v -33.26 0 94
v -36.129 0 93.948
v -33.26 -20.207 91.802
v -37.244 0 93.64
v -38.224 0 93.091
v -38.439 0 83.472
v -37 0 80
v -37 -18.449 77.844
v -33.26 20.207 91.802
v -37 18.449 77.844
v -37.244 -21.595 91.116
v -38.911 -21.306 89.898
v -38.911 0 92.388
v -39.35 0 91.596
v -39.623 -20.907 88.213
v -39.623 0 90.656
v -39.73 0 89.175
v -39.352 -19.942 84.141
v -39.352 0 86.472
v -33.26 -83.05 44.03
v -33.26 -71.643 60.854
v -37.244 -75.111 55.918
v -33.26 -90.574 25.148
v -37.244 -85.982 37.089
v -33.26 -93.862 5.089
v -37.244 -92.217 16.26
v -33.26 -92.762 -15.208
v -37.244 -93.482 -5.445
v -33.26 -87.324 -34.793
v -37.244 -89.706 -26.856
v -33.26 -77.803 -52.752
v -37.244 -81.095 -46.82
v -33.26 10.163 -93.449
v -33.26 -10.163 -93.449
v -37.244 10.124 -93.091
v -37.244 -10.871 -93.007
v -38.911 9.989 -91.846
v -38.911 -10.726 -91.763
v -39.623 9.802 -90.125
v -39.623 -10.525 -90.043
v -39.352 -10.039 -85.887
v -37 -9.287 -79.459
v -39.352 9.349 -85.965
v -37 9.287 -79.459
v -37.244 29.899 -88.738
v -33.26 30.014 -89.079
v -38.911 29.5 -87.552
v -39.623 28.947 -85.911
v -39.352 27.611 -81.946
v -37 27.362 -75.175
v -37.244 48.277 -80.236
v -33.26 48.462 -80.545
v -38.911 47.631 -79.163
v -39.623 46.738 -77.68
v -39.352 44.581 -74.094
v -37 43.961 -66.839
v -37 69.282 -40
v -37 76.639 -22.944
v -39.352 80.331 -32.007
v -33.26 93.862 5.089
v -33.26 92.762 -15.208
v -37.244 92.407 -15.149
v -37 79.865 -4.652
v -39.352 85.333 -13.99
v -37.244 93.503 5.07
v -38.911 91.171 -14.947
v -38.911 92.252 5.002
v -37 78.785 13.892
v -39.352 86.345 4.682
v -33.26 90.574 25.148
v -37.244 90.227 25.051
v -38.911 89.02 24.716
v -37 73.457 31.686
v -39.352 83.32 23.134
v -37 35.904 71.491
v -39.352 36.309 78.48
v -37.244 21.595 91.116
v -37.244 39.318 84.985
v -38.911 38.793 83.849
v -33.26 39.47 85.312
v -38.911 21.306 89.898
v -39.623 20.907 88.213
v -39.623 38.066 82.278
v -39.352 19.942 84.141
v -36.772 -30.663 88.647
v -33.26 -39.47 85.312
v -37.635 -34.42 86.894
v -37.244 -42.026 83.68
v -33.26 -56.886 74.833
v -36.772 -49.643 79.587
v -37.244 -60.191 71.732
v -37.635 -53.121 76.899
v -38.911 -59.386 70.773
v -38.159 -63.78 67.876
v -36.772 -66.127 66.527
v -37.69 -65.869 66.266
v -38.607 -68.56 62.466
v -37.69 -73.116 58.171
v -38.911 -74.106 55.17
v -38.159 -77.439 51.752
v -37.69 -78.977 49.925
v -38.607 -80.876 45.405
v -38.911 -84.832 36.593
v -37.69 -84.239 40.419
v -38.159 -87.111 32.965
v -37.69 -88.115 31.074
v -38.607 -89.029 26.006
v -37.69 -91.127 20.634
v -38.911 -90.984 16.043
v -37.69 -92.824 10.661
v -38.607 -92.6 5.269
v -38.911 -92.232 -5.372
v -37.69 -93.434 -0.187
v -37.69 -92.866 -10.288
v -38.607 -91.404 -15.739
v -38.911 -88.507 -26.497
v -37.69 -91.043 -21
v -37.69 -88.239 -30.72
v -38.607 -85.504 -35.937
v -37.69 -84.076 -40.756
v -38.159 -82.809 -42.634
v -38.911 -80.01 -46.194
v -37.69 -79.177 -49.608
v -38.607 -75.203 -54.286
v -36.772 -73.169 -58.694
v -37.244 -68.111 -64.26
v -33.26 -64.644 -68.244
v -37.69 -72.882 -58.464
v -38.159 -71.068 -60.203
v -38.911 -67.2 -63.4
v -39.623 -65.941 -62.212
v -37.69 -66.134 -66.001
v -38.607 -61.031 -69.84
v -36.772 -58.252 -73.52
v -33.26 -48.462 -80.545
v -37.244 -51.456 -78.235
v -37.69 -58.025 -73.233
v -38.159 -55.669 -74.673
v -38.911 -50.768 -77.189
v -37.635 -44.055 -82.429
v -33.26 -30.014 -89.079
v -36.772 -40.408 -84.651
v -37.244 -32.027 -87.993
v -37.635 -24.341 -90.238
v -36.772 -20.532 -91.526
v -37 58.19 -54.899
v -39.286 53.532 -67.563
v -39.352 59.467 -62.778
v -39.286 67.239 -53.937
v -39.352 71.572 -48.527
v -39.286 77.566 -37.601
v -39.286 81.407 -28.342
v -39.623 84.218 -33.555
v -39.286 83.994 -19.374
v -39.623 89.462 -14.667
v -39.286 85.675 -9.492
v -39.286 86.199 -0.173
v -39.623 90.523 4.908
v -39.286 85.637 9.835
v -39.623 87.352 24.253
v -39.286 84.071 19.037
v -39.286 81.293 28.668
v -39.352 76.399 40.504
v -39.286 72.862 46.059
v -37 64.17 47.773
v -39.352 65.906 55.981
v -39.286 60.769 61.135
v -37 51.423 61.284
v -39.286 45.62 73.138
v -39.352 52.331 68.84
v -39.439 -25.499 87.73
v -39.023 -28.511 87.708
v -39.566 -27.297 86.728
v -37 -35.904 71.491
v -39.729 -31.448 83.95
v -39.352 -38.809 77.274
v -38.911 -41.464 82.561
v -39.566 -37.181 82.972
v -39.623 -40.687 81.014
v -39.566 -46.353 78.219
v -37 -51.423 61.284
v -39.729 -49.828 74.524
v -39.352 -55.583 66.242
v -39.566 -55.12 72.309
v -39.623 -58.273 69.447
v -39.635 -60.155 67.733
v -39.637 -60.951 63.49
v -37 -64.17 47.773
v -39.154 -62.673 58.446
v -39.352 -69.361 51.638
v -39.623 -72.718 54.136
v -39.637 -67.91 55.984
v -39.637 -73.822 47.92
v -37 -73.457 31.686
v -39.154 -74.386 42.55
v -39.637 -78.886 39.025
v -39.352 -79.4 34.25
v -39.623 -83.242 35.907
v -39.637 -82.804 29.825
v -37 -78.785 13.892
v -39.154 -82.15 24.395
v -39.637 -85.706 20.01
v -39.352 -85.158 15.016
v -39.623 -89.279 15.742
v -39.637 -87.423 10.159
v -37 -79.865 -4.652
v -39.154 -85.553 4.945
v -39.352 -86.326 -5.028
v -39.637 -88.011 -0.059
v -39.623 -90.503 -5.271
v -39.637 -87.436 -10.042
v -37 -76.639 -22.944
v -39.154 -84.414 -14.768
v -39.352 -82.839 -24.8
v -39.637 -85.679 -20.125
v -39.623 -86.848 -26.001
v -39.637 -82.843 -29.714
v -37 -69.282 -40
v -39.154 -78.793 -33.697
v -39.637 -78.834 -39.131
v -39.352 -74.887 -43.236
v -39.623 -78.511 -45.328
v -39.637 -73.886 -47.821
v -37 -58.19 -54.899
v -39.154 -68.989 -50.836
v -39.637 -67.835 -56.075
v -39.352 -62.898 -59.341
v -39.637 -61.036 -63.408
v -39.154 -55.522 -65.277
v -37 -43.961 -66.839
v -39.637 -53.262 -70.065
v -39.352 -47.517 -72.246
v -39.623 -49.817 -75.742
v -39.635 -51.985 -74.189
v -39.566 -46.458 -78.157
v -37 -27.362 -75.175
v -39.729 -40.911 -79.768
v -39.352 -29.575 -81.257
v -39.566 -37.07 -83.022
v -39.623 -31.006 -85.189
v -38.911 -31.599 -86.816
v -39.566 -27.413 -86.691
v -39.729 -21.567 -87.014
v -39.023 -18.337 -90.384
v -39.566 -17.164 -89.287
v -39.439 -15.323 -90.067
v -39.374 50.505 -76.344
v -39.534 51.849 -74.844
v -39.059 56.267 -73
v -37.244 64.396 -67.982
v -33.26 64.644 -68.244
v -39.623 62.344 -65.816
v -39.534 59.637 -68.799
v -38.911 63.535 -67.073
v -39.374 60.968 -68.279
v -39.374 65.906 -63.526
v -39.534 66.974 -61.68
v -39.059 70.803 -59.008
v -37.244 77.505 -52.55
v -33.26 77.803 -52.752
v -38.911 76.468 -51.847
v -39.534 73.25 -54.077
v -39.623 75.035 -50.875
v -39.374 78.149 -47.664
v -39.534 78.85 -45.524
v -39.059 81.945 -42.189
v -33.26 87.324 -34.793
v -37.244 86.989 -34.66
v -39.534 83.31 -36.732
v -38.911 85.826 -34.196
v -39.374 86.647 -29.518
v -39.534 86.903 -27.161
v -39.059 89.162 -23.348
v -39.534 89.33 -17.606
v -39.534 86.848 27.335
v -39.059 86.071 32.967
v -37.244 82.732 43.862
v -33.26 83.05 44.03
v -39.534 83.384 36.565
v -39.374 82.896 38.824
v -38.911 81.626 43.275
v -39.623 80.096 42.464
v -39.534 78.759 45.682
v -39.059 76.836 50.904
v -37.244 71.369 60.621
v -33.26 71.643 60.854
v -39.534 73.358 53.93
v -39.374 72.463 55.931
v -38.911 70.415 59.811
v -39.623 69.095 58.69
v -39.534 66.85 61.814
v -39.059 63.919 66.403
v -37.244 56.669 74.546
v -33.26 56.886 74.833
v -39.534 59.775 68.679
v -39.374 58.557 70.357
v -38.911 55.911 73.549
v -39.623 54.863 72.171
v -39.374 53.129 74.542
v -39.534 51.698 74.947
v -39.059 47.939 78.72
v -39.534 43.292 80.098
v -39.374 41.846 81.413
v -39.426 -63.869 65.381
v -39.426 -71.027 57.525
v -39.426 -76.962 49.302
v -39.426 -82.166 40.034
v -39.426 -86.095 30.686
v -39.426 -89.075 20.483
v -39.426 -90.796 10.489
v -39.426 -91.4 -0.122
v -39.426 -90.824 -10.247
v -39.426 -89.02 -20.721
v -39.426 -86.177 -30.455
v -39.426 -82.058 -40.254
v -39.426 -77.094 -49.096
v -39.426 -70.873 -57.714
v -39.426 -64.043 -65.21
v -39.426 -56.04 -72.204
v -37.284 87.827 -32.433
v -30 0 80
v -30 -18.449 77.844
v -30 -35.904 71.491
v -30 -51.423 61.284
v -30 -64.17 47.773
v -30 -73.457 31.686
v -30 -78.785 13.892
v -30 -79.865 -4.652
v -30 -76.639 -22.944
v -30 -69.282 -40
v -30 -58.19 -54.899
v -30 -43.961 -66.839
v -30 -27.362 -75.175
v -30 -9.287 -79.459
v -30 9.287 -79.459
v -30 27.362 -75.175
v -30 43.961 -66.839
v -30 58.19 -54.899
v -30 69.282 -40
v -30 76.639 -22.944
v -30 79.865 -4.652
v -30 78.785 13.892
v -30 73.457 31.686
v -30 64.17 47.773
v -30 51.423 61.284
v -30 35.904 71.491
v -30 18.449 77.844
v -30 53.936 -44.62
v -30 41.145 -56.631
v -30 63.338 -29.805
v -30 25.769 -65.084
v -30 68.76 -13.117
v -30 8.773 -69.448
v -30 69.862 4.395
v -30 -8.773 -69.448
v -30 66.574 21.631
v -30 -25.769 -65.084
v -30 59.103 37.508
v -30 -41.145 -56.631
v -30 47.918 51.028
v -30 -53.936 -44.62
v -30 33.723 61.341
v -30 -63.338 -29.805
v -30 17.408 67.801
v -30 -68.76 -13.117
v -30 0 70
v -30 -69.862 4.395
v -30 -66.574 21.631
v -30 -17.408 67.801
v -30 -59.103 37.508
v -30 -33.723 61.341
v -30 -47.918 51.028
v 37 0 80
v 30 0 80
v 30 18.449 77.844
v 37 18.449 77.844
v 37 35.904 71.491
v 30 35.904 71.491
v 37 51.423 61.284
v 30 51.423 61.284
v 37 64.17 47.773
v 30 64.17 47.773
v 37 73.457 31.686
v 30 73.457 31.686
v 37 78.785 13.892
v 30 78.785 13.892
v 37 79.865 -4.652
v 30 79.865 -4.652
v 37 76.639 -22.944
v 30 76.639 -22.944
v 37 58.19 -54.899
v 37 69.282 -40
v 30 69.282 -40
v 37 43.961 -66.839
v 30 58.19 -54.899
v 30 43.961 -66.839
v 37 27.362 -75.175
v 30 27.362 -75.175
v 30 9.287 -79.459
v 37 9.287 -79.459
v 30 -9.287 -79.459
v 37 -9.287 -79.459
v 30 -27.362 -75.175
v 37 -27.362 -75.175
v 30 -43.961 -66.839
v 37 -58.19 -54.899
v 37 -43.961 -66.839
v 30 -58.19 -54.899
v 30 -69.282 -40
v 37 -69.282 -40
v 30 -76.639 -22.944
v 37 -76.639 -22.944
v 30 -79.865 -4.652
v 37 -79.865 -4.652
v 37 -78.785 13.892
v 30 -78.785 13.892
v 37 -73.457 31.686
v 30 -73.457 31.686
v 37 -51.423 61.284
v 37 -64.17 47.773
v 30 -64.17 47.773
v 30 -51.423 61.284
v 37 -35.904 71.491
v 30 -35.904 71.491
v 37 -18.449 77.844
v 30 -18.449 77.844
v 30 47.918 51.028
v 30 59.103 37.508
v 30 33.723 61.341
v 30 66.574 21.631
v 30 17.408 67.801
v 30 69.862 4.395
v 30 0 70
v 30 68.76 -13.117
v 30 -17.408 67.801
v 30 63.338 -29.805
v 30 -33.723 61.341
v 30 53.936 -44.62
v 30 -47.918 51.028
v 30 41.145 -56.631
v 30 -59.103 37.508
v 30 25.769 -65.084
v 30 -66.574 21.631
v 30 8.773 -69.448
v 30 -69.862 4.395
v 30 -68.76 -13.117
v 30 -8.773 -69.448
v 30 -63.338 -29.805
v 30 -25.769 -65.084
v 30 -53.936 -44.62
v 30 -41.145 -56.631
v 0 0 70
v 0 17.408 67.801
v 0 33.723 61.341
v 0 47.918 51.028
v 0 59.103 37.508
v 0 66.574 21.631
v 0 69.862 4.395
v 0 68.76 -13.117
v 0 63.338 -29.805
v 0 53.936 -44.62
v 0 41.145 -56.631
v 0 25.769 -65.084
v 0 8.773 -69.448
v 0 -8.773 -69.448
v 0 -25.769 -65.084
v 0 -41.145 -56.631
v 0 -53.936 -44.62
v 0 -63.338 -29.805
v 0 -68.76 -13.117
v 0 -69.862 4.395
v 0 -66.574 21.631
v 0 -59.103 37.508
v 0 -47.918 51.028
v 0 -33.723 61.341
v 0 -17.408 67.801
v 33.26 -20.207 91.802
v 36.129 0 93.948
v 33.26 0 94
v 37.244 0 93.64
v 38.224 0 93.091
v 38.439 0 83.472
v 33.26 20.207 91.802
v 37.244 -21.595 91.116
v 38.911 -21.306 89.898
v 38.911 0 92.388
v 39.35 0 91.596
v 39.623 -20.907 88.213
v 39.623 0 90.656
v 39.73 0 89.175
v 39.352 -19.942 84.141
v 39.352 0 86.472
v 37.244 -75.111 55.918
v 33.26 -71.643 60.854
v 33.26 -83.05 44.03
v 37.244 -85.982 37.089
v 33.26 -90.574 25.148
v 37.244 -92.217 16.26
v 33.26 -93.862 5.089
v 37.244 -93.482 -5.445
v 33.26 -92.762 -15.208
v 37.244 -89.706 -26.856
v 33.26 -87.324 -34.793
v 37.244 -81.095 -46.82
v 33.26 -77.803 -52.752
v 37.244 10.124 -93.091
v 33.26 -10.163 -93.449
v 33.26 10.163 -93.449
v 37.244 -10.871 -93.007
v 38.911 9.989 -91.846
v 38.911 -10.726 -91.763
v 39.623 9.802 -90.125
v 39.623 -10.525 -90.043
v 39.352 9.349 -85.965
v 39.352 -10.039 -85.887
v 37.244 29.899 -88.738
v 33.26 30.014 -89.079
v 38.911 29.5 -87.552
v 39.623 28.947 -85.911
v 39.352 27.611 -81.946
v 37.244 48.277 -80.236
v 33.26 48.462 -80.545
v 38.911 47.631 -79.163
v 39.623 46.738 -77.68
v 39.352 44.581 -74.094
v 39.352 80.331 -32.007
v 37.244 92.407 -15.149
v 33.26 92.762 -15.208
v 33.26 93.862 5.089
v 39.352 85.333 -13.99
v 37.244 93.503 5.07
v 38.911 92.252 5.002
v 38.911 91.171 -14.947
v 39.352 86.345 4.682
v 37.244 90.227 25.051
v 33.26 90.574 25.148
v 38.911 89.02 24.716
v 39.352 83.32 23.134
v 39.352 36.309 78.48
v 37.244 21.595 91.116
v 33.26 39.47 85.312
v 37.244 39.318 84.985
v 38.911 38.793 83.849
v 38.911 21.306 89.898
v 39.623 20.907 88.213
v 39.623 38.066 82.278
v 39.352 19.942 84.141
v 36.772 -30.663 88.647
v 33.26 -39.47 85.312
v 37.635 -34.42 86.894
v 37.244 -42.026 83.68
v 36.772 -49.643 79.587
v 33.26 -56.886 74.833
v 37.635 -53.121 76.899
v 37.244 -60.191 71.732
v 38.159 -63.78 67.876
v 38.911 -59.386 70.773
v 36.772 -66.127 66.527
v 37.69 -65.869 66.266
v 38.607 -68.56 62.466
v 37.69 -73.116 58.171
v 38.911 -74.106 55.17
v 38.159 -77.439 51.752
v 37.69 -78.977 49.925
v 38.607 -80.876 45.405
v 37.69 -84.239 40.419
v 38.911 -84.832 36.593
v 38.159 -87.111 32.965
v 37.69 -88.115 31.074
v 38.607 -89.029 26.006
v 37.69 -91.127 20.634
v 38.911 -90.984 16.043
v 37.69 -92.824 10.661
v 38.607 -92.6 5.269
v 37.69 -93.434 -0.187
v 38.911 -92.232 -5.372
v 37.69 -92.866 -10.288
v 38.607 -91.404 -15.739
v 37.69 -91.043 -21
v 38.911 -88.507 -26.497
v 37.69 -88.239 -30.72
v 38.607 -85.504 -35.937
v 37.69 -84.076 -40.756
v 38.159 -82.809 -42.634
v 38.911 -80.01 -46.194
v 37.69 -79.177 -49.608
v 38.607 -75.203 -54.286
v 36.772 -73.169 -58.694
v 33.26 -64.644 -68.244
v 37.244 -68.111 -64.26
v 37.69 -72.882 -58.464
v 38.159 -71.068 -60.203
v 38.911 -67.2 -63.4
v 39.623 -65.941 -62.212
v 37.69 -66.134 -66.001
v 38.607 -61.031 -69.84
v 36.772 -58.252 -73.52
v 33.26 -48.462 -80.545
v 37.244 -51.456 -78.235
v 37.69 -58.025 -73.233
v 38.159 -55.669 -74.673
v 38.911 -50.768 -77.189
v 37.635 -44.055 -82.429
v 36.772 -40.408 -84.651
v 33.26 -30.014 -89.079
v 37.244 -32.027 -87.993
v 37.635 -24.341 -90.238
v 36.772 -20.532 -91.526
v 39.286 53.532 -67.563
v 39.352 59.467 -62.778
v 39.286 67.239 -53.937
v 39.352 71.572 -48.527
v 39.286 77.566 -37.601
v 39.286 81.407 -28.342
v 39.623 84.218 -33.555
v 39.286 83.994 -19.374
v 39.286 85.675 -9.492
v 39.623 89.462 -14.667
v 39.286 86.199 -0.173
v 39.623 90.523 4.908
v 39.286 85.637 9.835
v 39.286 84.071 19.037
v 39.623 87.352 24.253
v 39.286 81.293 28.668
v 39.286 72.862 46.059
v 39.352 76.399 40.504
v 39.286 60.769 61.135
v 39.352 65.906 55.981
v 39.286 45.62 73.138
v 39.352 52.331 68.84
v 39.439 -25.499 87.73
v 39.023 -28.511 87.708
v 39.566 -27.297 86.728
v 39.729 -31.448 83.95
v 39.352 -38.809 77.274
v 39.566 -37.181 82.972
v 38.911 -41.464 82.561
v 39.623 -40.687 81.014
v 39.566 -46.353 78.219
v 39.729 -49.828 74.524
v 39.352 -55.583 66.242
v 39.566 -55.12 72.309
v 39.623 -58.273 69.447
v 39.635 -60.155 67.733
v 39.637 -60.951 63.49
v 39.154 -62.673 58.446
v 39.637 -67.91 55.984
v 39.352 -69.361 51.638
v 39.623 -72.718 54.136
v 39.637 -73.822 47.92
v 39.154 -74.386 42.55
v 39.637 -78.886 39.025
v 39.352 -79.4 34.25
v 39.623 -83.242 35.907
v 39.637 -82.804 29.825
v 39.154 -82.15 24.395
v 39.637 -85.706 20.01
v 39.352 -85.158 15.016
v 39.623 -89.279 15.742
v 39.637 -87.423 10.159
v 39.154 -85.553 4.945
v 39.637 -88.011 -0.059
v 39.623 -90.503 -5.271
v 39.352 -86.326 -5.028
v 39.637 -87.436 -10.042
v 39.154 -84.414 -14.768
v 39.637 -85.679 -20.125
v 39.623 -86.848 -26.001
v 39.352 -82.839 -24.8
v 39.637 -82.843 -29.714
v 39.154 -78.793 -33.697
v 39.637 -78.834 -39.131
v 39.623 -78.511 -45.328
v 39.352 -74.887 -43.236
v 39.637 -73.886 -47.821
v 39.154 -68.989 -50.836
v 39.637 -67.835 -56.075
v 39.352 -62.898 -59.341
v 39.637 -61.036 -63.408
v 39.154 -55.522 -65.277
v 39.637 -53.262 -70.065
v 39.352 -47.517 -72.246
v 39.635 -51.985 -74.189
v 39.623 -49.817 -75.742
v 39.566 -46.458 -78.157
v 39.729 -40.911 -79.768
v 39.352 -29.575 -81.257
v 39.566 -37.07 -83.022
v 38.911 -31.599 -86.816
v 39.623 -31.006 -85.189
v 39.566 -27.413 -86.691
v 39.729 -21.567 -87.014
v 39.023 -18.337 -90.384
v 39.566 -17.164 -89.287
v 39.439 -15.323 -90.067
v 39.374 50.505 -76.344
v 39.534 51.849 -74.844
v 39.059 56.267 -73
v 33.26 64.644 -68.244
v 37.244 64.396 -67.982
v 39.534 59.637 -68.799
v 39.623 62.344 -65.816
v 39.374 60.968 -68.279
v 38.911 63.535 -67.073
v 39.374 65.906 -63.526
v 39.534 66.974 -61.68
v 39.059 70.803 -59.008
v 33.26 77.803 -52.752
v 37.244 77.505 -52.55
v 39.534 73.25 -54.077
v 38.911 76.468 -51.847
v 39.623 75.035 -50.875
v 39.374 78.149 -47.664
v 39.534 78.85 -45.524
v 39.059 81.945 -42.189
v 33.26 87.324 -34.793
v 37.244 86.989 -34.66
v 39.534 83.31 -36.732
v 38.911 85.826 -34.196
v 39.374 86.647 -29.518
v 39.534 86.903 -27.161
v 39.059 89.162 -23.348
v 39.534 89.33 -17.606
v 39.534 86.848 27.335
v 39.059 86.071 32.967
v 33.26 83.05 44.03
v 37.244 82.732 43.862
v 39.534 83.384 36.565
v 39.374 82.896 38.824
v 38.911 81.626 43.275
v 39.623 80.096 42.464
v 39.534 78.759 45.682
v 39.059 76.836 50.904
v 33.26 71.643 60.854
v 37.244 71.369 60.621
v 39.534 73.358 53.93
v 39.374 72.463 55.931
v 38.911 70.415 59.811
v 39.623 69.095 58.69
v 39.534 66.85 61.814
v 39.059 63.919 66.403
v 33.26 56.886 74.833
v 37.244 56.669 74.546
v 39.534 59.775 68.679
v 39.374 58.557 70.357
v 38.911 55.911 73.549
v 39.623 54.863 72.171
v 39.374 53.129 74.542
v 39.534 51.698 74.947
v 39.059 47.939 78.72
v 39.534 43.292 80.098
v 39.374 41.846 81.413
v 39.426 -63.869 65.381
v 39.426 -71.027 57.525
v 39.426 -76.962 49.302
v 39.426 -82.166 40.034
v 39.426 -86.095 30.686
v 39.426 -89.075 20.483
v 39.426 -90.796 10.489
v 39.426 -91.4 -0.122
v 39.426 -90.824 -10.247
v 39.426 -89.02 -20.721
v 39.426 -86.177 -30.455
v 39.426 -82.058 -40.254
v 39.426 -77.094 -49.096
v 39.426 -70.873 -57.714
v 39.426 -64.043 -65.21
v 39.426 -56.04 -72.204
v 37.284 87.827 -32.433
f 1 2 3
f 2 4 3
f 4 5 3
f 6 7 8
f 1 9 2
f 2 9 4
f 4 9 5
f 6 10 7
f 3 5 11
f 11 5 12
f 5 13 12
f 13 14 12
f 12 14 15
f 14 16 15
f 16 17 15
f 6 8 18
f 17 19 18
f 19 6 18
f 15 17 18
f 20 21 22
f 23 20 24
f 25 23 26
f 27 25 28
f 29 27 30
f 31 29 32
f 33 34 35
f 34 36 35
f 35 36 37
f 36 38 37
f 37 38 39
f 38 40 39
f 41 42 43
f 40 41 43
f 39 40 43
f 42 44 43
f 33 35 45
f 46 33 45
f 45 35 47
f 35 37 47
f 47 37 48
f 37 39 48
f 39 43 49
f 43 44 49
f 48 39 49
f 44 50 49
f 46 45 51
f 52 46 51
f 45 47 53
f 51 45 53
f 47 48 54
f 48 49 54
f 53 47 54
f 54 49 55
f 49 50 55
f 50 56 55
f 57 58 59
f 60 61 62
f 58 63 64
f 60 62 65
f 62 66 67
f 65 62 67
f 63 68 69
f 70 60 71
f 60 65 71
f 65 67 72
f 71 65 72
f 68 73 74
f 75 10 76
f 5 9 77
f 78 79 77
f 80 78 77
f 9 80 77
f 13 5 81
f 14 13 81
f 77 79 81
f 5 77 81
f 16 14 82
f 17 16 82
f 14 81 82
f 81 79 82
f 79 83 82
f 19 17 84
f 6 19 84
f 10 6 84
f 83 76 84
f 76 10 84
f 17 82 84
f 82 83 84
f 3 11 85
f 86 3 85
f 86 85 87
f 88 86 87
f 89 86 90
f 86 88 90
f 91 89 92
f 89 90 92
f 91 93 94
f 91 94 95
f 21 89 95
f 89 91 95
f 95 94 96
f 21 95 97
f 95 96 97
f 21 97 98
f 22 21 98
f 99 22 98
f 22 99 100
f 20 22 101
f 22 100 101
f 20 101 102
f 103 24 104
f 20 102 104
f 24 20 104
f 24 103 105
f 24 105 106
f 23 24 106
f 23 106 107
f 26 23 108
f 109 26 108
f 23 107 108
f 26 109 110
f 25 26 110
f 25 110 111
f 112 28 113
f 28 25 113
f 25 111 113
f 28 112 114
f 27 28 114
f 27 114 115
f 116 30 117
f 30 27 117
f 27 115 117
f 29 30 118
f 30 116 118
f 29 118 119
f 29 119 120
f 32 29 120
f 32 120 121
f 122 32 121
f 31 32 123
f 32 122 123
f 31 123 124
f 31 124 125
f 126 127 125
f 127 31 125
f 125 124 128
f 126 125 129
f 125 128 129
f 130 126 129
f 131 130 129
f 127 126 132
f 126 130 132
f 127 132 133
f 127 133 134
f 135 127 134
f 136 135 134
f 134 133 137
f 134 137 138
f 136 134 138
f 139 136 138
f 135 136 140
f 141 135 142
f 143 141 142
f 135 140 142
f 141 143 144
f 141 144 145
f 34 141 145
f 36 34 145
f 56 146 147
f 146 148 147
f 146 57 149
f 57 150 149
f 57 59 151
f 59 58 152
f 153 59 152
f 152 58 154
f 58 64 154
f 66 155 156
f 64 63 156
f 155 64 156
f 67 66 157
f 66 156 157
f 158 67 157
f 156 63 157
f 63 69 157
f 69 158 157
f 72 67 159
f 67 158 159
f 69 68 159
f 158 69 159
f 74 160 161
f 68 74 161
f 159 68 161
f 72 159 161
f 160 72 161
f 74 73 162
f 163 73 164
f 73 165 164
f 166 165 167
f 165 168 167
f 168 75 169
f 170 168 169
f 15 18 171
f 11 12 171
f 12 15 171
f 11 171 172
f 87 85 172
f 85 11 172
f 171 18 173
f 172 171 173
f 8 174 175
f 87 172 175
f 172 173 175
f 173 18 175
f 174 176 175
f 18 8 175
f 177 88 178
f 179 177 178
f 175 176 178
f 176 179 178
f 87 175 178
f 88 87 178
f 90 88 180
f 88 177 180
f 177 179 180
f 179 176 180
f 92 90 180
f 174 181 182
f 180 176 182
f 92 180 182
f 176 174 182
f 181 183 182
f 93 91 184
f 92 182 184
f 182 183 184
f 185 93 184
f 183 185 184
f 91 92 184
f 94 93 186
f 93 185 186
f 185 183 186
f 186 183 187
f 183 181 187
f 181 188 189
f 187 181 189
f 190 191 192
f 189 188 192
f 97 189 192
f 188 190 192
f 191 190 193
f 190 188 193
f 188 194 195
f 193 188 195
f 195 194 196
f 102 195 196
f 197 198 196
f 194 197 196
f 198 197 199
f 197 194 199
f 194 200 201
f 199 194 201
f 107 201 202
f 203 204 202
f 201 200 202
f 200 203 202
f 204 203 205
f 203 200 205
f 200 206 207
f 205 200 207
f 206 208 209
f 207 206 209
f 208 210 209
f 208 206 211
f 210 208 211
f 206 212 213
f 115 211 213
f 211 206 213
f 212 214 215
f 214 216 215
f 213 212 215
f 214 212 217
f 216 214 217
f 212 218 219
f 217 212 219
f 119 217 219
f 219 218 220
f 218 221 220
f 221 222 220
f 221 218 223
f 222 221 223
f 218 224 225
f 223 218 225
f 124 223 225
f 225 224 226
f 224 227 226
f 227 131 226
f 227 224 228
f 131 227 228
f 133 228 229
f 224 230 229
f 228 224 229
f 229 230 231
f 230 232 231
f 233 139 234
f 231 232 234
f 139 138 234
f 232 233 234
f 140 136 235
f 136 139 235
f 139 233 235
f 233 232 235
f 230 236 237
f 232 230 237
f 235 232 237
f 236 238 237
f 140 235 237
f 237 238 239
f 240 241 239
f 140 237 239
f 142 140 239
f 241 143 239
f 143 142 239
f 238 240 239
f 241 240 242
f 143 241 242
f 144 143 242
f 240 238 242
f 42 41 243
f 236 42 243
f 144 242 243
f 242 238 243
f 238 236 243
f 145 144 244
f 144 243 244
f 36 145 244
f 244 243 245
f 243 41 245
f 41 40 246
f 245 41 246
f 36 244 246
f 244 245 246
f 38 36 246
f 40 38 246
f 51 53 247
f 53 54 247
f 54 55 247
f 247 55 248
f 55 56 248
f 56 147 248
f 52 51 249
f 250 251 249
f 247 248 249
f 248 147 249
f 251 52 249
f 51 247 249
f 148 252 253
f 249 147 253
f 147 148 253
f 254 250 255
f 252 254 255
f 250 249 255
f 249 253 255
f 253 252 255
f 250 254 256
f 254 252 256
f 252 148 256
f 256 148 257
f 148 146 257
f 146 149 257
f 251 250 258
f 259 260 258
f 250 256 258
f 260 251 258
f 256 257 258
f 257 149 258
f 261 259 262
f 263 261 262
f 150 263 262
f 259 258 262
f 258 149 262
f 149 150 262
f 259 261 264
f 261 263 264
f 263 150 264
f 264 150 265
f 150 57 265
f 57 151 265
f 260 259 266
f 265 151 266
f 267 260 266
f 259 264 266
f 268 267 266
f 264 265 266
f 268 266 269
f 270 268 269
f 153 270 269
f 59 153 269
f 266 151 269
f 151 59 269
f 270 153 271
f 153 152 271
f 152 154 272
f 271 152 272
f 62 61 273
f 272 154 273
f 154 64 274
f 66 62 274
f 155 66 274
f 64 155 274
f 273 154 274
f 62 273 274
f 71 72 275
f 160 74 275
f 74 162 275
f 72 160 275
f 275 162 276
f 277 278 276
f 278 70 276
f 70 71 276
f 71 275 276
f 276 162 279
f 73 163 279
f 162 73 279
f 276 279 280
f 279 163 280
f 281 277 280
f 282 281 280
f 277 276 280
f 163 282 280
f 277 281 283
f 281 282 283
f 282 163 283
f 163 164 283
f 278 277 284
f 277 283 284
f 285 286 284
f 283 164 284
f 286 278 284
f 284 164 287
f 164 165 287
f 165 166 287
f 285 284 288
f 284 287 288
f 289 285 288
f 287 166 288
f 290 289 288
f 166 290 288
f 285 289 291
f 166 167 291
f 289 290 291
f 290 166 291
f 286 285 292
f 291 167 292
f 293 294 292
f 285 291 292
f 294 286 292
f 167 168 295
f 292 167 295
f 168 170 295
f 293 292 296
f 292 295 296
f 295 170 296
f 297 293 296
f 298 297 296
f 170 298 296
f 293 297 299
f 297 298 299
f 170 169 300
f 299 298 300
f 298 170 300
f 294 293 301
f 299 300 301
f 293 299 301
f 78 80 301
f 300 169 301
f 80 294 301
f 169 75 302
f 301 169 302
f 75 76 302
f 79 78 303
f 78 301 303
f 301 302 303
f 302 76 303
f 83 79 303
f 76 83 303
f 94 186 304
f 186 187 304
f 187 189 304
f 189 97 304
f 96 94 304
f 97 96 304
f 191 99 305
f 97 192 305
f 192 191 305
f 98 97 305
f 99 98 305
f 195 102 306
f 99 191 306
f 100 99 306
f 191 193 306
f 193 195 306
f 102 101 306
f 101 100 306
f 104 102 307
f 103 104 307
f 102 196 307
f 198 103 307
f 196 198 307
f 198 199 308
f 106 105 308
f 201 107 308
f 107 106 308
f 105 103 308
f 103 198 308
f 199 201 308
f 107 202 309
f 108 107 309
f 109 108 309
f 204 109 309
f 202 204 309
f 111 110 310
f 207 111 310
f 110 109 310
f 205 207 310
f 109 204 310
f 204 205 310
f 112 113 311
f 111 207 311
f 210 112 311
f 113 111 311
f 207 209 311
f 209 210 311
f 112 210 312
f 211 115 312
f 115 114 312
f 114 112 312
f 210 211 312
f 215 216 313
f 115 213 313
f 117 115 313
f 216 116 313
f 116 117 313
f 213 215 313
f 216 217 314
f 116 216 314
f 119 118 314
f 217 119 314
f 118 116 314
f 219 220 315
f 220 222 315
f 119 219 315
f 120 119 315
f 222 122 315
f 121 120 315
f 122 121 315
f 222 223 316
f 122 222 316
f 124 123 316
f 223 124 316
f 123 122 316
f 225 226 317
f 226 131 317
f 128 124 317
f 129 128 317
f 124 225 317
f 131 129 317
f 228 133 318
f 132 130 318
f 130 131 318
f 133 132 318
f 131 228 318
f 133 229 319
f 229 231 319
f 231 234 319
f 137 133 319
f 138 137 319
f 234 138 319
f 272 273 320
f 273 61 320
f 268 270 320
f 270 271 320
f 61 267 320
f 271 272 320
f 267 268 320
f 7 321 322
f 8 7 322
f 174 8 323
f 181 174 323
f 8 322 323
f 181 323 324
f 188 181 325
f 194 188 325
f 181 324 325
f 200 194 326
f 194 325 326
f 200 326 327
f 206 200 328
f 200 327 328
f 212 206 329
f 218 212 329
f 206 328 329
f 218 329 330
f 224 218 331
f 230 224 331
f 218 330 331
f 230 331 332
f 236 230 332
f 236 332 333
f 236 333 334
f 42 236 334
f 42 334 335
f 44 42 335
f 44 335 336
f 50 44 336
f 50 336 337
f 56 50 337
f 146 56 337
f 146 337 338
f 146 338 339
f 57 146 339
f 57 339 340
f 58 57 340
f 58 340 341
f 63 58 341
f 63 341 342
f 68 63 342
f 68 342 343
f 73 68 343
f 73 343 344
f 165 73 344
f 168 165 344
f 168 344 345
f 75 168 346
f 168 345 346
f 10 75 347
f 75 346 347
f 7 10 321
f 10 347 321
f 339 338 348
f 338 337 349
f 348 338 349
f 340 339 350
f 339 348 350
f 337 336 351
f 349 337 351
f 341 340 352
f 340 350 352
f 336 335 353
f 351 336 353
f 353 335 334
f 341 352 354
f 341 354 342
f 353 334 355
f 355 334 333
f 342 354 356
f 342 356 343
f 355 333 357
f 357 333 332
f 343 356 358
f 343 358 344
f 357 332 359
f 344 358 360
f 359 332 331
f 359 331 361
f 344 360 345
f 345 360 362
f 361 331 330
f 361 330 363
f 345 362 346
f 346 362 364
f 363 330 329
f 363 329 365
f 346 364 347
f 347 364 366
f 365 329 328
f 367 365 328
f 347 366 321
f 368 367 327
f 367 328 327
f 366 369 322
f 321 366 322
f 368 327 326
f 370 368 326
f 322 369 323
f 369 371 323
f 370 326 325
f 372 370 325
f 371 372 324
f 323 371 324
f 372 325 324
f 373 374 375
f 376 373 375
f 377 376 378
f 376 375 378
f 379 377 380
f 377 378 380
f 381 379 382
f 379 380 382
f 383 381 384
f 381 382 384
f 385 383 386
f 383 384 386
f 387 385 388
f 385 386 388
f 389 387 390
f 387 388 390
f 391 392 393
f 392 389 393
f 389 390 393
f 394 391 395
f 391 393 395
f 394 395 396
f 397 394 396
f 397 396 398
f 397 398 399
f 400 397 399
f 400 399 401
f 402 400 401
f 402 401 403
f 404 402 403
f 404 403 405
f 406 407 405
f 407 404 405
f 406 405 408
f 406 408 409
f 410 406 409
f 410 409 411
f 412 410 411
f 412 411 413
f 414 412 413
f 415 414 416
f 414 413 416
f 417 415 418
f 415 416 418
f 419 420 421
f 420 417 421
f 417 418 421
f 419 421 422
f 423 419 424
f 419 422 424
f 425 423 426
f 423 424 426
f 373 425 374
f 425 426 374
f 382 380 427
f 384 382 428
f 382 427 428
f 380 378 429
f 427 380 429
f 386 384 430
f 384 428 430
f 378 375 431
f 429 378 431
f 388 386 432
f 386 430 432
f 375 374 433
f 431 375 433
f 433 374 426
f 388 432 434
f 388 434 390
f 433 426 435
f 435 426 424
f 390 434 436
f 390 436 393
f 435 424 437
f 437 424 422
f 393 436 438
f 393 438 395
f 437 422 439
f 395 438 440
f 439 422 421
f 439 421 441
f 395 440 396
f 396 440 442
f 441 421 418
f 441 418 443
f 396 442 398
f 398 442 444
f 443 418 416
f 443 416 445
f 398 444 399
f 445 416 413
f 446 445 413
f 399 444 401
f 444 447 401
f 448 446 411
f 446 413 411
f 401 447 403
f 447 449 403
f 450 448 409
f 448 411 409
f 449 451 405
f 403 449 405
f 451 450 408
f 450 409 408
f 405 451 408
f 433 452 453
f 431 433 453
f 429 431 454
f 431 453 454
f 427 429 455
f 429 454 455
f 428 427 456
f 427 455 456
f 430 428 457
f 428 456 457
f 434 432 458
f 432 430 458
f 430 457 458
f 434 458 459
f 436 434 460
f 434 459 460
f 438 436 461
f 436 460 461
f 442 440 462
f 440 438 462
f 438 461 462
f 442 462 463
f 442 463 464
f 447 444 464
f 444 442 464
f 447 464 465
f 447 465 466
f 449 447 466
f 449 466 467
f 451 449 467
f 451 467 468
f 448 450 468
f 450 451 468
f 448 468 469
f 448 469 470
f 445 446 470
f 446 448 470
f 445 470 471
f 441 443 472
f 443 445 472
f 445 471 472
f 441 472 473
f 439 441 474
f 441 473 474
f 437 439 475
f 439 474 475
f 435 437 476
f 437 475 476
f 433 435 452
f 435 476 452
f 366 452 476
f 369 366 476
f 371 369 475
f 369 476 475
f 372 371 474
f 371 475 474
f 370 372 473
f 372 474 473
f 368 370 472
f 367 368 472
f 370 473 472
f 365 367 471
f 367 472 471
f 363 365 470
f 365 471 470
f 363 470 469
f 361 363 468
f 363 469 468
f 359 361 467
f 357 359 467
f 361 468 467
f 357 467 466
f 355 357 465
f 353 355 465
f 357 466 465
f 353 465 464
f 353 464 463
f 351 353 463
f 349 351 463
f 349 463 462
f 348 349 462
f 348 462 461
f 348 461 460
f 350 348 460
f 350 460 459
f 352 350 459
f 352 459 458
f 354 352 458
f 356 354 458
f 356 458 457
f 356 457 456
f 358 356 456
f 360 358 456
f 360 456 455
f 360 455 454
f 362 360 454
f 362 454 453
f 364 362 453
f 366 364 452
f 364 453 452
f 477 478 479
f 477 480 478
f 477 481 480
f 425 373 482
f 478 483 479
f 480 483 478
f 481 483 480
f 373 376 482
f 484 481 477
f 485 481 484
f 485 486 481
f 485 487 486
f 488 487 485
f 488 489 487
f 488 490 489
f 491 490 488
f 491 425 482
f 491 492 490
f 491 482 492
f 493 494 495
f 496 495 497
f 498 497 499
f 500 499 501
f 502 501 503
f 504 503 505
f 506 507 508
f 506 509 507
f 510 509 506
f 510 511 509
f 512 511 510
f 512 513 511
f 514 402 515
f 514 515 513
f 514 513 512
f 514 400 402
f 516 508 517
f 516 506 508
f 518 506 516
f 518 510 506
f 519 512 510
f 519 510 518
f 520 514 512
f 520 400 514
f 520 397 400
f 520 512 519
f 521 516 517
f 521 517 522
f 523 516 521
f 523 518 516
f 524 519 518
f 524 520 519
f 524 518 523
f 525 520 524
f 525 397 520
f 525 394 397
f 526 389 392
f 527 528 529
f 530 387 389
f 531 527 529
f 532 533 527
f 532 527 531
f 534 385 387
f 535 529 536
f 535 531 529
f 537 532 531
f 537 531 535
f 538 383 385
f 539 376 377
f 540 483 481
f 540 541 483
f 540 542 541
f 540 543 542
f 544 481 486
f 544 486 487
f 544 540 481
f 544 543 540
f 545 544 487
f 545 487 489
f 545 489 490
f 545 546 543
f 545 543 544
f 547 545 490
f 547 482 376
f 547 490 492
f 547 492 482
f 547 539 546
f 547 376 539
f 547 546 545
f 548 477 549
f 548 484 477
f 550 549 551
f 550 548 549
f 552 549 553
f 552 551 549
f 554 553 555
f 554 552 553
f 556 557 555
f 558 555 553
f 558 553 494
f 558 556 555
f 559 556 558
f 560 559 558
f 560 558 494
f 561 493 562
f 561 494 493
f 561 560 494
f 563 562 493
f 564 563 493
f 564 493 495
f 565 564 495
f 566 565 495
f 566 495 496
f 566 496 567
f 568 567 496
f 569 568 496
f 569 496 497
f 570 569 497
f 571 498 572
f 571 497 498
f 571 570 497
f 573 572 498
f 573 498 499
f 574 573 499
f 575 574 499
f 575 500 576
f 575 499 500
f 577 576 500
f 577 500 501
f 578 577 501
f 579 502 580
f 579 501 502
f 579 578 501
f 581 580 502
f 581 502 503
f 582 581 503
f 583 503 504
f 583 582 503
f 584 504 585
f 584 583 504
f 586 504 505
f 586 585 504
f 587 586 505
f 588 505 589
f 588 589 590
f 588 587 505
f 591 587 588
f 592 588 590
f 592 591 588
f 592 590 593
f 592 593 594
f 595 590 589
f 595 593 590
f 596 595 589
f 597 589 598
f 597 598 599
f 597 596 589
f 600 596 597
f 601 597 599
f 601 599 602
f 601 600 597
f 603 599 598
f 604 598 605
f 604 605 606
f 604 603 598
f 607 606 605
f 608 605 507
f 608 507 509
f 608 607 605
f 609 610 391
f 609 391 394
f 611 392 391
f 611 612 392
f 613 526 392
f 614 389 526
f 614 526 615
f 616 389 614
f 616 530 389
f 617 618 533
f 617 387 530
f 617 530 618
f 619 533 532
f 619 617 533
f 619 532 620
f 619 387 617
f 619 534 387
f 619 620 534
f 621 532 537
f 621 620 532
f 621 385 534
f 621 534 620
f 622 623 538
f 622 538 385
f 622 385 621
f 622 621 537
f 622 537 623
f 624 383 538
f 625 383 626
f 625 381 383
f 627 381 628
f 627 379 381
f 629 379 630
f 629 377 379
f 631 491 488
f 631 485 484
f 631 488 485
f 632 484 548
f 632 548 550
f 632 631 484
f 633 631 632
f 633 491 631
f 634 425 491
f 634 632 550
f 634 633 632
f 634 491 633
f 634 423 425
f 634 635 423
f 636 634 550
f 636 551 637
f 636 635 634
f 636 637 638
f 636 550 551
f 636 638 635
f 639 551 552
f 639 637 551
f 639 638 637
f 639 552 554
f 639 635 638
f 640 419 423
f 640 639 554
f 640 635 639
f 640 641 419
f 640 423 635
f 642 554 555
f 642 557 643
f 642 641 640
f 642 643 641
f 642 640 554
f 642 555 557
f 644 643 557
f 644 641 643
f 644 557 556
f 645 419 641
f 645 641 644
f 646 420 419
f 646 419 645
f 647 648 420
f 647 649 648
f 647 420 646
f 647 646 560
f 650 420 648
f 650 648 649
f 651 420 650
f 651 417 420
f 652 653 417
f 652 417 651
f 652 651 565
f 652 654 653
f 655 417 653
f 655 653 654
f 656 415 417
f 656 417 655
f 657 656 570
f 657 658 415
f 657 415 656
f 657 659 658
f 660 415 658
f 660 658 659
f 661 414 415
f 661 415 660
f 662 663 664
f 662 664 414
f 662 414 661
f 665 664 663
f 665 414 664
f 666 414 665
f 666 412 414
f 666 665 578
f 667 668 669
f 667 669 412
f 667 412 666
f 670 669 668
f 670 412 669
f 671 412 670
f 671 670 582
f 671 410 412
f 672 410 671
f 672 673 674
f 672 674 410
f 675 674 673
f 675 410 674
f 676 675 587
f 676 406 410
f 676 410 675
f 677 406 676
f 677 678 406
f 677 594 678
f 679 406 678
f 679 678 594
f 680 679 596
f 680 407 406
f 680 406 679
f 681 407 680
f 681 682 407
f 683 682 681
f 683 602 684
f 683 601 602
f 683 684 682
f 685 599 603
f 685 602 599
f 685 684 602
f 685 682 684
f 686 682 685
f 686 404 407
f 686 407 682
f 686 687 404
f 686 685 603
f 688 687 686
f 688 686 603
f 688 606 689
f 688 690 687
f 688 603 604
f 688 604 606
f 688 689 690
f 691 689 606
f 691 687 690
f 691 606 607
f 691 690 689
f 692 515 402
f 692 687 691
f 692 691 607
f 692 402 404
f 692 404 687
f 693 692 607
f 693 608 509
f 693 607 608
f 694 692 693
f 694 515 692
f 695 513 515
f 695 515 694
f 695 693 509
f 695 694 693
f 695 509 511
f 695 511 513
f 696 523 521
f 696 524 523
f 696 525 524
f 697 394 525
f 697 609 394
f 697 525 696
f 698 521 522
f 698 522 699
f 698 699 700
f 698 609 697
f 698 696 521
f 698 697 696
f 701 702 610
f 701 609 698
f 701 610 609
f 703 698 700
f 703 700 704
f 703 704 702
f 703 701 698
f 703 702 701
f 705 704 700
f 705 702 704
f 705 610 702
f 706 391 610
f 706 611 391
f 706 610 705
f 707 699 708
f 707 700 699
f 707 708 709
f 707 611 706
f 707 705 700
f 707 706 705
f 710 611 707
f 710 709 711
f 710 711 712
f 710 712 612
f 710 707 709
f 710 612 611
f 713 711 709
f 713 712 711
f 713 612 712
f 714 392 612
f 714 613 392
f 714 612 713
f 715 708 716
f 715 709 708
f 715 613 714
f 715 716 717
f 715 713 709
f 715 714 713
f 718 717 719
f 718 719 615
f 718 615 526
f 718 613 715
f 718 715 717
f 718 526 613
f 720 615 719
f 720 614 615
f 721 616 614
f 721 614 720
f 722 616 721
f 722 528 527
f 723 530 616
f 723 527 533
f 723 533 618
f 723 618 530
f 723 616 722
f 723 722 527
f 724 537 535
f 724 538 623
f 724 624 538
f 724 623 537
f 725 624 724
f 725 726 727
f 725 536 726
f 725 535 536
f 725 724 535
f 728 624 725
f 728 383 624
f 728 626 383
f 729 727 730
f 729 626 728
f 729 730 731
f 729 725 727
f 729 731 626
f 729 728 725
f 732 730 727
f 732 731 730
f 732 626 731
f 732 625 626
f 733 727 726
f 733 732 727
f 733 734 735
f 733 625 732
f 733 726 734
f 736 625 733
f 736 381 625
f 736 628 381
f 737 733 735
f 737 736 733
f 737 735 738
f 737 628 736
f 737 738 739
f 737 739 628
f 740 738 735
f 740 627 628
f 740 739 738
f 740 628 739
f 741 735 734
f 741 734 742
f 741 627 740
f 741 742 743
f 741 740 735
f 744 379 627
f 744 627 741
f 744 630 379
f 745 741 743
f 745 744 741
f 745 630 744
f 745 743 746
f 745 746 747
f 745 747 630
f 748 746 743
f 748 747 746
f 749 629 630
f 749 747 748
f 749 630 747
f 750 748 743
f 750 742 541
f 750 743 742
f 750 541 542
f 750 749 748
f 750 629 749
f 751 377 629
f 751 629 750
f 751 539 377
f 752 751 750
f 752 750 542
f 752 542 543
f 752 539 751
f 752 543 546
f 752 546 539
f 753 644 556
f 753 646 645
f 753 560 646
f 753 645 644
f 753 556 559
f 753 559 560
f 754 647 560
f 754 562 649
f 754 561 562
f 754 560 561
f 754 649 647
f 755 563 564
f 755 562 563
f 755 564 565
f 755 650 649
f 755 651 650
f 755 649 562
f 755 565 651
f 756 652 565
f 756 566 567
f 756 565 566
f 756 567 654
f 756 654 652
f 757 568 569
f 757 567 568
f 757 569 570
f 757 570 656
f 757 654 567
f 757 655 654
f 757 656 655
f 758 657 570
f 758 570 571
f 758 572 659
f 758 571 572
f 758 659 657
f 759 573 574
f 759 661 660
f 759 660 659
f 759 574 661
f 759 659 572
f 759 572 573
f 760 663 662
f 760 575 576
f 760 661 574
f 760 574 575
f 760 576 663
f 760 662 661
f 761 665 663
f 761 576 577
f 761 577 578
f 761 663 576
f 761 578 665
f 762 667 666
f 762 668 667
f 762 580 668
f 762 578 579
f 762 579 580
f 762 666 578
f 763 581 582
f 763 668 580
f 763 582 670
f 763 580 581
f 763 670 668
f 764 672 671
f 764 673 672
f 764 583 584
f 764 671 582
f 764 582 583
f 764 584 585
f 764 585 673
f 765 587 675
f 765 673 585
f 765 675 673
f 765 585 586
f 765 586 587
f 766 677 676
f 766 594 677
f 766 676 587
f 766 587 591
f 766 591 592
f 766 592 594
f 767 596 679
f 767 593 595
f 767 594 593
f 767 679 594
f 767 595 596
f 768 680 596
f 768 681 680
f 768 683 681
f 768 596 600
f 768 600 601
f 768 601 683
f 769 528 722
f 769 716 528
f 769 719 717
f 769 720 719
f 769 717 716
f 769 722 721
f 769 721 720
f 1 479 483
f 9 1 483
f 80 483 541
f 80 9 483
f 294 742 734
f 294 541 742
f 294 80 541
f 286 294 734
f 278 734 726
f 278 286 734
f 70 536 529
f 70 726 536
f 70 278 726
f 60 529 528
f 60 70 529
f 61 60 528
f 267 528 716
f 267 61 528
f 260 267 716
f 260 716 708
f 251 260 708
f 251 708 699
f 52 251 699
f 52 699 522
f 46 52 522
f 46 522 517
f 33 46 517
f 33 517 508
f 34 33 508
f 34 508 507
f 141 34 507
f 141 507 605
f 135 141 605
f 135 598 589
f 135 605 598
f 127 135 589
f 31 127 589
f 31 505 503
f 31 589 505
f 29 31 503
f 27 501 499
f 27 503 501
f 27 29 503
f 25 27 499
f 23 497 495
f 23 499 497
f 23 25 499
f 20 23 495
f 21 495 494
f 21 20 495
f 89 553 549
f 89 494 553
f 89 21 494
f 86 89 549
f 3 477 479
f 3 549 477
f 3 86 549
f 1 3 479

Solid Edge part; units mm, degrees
sketch "Sketch1" plane through (0, 0, 0) normal (0, -1, 0) x (1, 0, 0)
  line L0 (0, 94) -> (-33.2601, 94)
  spline S0 degree 3 poles (-33.2601, 94) (-40.5942, 94.7307) (-41.4837, 89.7803) (-37, 80) knots 0 0 0 0 1 1 1 1
  line L1 (-37, 80) -> (-30, 80)
  line L2 (-30, 80) -> (-30, 70)
  line L3 (-30, 70) -> (0, 70)
  line L4 (0, 94) -> (0, 70)
  dimension "D1" = 7
  dimension "D2" = 10
  dimension "D3" = 30
  dimension "D4" = 33.2601
  dimension "D5" = 24
revolve "RevolvedProtrusion1" add sketch "Sketch1" angle 360 about axis through (-60, 0, 0) along (1, 0, 0)
mirror "Mirror1" about plane through (0, 0, 0) normal (1, 0, 0) of "RevolvedProtrusion1"
